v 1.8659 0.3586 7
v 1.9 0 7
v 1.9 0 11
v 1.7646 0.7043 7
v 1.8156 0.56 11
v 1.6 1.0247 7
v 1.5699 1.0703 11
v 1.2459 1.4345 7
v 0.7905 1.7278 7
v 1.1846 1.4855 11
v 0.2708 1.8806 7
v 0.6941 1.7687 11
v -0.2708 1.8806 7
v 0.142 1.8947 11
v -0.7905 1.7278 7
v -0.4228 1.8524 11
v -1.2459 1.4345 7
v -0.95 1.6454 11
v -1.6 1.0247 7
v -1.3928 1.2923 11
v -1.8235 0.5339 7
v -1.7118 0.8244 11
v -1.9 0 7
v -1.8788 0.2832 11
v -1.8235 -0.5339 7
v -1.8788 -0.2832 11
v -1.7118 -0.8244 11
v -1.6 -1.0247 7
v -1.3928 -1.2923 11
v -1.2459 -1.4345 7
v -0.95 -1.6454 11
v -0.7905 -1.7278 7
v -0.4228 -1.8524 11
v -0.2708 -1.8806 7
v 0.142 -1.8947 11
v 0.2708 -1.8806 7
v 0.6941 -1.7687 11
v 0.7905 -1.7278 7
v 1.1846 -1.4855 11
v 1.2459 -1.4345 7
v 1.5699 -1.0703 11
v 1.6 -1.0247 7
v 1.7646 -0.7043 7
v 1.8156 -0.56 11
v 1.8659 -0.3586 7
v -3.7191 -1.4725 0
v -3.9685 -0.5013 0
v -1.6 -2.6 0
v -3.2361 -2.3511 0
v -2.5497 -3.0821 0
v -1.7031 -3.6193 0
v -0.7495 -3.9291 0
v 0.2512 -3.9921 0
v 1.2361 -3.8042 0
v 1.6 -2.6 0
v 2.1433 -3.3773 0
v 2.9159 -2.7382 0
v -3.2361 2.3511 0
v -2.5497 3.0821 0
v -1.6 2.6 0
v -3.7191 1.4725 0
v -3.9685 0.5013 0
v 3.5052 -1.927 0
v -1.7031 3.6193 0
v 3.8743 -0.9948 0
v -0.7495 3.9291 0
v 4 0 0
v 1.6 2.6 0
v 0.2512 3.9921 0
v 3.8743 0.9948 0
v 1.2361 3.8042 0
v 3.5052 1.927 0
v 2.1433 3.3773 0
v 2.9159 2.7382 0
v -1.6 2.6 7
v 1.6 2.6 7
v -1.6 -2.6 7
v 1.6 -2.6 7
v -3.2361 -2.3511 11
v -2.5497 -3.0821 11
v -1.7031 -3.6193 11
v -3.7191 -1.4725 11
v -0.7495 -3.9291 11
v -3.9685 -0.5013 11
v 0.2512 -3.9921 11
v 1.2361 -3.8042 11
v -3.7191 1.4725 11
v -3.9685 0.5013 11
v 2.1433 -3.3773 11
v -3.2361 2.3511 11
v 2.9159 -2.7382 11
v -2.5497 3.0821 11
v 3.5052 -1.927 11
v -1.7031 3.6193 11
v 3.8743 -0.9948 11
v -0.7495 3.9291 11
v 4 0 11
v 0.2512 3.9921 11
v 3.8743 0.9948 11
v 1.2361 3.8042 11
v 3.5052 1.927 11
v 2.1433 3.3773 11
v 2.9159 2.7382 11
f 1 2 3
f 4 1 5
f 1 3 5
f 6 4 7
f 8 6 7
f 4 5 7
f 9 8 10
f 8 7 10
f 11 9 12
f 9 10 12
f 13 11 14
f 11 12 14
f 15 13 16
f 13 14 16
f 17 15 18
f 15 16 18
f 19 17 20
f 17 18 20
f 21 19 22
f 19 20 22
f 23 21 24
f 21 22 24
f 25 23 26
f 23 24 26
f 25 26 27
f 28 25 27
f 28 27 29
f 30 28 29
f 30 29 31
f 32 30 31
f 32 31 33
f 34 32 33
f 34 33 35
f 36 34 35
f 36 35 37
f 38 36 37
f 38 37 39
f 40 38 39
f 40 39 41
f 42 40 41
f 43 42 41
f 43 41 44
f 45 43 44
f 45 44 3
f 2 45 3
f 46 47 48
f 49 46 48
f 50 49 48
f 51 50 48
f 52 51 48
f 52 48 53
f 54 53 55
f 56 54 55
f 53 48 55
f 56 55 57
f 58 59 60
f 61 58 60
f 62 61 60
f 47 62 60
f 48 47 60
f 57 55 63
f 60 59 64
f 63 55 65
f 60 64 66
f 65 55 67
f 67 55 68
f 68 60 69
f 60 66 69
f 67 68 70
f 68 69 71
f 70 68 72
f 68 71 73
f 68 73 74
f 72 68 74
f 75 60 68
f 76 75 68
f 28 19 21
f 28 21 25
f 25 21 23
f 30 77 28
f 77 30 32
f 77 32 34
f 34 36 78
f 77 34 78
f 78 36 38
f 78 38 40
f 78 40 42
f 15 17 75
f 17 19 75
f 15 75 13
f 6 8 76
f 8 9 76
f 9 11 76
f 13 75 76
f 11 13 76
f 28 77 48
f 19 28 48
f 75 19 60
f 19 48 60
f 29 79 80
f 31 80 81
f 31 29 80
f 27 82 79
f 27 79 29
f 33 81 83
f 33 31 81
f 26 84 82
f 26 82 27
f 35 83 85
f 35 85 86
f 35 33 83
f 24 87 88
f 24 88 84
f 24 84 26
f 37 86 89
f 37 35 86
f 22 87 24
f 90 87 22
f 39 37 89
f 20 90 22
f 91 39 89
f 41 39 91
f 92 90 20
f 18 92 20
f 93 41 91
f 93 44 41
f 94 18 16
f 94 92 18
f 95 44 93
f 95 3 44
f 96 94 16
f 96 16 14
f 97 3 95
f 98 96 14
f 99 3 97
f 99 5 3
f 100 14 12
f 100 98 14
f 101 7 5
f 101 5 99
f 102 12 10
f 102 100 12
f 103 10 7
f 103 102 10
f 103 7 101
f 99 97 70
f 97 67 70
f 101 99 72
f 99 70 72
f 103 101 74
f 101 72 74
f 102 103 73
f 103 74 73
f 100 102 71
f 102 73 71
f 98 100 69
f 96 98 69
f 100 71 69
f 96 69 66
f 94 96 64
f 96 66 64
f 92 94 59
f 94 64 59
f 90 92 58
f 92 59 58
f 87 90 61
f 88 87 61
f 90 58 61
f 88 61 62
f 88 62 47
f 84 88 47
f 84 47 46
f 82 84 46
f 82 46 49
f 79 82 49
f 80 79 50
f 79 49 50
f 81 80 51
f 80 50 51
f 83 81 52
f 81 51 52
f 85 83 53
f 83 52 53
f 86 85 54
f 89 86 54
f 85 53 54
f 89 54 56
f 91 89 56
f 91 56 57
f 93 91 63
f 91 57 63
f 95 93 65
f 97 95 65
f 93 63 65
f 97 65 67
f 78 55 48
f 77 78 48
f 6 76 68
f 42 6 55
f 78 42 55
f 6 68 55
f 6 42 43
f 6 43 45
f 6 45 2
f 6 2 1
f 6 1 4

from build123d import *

# Parameters (mm, degrees)
SKETCH1_R           = 4
BOSS_EXTRUDE1_DEPTH = 7
SKETCH2_R           = 4
BOSS_EXTRUDE2_DEPTH = 4
SKETCH3_R           = 1.9
CUT_EXTRUDE1_DEPTH  = 4


with BuildPart() as part:
    # Sketch1 → Boss-Extrude1 (new body)
    with BuildSketch(Plane.XY):
        Circle(SKETCH1_R)
        Polygon((-1.6, 0), (-1.6, 2.6), (1.6, 2.6), (1.6, -2.6), (-1.6, -2.6), align=None, mode=Mode.SUBTRACT)
    extrude(amount=BOSS_EXTRUDE1_DEPTH)

    # Sketch2 → Boss-Extrude2 (add)
    with BuildSketch(Plane.XY.offset(7)):
        Circle(SKETCH2_R)
    extrude(amount=BOSS_EXTRUDE2_DEPTH)

    # Sketch3 → Cut-Extrude1 (cut)
    with BuildSketch(Plane.XY.offset(11)):
        Circle(SKETCH3_R)
    extrude(amount=-CUT_EXTRUDE1_DEPTH, mode=Mode.SUBTRACT)


solid = part.part
